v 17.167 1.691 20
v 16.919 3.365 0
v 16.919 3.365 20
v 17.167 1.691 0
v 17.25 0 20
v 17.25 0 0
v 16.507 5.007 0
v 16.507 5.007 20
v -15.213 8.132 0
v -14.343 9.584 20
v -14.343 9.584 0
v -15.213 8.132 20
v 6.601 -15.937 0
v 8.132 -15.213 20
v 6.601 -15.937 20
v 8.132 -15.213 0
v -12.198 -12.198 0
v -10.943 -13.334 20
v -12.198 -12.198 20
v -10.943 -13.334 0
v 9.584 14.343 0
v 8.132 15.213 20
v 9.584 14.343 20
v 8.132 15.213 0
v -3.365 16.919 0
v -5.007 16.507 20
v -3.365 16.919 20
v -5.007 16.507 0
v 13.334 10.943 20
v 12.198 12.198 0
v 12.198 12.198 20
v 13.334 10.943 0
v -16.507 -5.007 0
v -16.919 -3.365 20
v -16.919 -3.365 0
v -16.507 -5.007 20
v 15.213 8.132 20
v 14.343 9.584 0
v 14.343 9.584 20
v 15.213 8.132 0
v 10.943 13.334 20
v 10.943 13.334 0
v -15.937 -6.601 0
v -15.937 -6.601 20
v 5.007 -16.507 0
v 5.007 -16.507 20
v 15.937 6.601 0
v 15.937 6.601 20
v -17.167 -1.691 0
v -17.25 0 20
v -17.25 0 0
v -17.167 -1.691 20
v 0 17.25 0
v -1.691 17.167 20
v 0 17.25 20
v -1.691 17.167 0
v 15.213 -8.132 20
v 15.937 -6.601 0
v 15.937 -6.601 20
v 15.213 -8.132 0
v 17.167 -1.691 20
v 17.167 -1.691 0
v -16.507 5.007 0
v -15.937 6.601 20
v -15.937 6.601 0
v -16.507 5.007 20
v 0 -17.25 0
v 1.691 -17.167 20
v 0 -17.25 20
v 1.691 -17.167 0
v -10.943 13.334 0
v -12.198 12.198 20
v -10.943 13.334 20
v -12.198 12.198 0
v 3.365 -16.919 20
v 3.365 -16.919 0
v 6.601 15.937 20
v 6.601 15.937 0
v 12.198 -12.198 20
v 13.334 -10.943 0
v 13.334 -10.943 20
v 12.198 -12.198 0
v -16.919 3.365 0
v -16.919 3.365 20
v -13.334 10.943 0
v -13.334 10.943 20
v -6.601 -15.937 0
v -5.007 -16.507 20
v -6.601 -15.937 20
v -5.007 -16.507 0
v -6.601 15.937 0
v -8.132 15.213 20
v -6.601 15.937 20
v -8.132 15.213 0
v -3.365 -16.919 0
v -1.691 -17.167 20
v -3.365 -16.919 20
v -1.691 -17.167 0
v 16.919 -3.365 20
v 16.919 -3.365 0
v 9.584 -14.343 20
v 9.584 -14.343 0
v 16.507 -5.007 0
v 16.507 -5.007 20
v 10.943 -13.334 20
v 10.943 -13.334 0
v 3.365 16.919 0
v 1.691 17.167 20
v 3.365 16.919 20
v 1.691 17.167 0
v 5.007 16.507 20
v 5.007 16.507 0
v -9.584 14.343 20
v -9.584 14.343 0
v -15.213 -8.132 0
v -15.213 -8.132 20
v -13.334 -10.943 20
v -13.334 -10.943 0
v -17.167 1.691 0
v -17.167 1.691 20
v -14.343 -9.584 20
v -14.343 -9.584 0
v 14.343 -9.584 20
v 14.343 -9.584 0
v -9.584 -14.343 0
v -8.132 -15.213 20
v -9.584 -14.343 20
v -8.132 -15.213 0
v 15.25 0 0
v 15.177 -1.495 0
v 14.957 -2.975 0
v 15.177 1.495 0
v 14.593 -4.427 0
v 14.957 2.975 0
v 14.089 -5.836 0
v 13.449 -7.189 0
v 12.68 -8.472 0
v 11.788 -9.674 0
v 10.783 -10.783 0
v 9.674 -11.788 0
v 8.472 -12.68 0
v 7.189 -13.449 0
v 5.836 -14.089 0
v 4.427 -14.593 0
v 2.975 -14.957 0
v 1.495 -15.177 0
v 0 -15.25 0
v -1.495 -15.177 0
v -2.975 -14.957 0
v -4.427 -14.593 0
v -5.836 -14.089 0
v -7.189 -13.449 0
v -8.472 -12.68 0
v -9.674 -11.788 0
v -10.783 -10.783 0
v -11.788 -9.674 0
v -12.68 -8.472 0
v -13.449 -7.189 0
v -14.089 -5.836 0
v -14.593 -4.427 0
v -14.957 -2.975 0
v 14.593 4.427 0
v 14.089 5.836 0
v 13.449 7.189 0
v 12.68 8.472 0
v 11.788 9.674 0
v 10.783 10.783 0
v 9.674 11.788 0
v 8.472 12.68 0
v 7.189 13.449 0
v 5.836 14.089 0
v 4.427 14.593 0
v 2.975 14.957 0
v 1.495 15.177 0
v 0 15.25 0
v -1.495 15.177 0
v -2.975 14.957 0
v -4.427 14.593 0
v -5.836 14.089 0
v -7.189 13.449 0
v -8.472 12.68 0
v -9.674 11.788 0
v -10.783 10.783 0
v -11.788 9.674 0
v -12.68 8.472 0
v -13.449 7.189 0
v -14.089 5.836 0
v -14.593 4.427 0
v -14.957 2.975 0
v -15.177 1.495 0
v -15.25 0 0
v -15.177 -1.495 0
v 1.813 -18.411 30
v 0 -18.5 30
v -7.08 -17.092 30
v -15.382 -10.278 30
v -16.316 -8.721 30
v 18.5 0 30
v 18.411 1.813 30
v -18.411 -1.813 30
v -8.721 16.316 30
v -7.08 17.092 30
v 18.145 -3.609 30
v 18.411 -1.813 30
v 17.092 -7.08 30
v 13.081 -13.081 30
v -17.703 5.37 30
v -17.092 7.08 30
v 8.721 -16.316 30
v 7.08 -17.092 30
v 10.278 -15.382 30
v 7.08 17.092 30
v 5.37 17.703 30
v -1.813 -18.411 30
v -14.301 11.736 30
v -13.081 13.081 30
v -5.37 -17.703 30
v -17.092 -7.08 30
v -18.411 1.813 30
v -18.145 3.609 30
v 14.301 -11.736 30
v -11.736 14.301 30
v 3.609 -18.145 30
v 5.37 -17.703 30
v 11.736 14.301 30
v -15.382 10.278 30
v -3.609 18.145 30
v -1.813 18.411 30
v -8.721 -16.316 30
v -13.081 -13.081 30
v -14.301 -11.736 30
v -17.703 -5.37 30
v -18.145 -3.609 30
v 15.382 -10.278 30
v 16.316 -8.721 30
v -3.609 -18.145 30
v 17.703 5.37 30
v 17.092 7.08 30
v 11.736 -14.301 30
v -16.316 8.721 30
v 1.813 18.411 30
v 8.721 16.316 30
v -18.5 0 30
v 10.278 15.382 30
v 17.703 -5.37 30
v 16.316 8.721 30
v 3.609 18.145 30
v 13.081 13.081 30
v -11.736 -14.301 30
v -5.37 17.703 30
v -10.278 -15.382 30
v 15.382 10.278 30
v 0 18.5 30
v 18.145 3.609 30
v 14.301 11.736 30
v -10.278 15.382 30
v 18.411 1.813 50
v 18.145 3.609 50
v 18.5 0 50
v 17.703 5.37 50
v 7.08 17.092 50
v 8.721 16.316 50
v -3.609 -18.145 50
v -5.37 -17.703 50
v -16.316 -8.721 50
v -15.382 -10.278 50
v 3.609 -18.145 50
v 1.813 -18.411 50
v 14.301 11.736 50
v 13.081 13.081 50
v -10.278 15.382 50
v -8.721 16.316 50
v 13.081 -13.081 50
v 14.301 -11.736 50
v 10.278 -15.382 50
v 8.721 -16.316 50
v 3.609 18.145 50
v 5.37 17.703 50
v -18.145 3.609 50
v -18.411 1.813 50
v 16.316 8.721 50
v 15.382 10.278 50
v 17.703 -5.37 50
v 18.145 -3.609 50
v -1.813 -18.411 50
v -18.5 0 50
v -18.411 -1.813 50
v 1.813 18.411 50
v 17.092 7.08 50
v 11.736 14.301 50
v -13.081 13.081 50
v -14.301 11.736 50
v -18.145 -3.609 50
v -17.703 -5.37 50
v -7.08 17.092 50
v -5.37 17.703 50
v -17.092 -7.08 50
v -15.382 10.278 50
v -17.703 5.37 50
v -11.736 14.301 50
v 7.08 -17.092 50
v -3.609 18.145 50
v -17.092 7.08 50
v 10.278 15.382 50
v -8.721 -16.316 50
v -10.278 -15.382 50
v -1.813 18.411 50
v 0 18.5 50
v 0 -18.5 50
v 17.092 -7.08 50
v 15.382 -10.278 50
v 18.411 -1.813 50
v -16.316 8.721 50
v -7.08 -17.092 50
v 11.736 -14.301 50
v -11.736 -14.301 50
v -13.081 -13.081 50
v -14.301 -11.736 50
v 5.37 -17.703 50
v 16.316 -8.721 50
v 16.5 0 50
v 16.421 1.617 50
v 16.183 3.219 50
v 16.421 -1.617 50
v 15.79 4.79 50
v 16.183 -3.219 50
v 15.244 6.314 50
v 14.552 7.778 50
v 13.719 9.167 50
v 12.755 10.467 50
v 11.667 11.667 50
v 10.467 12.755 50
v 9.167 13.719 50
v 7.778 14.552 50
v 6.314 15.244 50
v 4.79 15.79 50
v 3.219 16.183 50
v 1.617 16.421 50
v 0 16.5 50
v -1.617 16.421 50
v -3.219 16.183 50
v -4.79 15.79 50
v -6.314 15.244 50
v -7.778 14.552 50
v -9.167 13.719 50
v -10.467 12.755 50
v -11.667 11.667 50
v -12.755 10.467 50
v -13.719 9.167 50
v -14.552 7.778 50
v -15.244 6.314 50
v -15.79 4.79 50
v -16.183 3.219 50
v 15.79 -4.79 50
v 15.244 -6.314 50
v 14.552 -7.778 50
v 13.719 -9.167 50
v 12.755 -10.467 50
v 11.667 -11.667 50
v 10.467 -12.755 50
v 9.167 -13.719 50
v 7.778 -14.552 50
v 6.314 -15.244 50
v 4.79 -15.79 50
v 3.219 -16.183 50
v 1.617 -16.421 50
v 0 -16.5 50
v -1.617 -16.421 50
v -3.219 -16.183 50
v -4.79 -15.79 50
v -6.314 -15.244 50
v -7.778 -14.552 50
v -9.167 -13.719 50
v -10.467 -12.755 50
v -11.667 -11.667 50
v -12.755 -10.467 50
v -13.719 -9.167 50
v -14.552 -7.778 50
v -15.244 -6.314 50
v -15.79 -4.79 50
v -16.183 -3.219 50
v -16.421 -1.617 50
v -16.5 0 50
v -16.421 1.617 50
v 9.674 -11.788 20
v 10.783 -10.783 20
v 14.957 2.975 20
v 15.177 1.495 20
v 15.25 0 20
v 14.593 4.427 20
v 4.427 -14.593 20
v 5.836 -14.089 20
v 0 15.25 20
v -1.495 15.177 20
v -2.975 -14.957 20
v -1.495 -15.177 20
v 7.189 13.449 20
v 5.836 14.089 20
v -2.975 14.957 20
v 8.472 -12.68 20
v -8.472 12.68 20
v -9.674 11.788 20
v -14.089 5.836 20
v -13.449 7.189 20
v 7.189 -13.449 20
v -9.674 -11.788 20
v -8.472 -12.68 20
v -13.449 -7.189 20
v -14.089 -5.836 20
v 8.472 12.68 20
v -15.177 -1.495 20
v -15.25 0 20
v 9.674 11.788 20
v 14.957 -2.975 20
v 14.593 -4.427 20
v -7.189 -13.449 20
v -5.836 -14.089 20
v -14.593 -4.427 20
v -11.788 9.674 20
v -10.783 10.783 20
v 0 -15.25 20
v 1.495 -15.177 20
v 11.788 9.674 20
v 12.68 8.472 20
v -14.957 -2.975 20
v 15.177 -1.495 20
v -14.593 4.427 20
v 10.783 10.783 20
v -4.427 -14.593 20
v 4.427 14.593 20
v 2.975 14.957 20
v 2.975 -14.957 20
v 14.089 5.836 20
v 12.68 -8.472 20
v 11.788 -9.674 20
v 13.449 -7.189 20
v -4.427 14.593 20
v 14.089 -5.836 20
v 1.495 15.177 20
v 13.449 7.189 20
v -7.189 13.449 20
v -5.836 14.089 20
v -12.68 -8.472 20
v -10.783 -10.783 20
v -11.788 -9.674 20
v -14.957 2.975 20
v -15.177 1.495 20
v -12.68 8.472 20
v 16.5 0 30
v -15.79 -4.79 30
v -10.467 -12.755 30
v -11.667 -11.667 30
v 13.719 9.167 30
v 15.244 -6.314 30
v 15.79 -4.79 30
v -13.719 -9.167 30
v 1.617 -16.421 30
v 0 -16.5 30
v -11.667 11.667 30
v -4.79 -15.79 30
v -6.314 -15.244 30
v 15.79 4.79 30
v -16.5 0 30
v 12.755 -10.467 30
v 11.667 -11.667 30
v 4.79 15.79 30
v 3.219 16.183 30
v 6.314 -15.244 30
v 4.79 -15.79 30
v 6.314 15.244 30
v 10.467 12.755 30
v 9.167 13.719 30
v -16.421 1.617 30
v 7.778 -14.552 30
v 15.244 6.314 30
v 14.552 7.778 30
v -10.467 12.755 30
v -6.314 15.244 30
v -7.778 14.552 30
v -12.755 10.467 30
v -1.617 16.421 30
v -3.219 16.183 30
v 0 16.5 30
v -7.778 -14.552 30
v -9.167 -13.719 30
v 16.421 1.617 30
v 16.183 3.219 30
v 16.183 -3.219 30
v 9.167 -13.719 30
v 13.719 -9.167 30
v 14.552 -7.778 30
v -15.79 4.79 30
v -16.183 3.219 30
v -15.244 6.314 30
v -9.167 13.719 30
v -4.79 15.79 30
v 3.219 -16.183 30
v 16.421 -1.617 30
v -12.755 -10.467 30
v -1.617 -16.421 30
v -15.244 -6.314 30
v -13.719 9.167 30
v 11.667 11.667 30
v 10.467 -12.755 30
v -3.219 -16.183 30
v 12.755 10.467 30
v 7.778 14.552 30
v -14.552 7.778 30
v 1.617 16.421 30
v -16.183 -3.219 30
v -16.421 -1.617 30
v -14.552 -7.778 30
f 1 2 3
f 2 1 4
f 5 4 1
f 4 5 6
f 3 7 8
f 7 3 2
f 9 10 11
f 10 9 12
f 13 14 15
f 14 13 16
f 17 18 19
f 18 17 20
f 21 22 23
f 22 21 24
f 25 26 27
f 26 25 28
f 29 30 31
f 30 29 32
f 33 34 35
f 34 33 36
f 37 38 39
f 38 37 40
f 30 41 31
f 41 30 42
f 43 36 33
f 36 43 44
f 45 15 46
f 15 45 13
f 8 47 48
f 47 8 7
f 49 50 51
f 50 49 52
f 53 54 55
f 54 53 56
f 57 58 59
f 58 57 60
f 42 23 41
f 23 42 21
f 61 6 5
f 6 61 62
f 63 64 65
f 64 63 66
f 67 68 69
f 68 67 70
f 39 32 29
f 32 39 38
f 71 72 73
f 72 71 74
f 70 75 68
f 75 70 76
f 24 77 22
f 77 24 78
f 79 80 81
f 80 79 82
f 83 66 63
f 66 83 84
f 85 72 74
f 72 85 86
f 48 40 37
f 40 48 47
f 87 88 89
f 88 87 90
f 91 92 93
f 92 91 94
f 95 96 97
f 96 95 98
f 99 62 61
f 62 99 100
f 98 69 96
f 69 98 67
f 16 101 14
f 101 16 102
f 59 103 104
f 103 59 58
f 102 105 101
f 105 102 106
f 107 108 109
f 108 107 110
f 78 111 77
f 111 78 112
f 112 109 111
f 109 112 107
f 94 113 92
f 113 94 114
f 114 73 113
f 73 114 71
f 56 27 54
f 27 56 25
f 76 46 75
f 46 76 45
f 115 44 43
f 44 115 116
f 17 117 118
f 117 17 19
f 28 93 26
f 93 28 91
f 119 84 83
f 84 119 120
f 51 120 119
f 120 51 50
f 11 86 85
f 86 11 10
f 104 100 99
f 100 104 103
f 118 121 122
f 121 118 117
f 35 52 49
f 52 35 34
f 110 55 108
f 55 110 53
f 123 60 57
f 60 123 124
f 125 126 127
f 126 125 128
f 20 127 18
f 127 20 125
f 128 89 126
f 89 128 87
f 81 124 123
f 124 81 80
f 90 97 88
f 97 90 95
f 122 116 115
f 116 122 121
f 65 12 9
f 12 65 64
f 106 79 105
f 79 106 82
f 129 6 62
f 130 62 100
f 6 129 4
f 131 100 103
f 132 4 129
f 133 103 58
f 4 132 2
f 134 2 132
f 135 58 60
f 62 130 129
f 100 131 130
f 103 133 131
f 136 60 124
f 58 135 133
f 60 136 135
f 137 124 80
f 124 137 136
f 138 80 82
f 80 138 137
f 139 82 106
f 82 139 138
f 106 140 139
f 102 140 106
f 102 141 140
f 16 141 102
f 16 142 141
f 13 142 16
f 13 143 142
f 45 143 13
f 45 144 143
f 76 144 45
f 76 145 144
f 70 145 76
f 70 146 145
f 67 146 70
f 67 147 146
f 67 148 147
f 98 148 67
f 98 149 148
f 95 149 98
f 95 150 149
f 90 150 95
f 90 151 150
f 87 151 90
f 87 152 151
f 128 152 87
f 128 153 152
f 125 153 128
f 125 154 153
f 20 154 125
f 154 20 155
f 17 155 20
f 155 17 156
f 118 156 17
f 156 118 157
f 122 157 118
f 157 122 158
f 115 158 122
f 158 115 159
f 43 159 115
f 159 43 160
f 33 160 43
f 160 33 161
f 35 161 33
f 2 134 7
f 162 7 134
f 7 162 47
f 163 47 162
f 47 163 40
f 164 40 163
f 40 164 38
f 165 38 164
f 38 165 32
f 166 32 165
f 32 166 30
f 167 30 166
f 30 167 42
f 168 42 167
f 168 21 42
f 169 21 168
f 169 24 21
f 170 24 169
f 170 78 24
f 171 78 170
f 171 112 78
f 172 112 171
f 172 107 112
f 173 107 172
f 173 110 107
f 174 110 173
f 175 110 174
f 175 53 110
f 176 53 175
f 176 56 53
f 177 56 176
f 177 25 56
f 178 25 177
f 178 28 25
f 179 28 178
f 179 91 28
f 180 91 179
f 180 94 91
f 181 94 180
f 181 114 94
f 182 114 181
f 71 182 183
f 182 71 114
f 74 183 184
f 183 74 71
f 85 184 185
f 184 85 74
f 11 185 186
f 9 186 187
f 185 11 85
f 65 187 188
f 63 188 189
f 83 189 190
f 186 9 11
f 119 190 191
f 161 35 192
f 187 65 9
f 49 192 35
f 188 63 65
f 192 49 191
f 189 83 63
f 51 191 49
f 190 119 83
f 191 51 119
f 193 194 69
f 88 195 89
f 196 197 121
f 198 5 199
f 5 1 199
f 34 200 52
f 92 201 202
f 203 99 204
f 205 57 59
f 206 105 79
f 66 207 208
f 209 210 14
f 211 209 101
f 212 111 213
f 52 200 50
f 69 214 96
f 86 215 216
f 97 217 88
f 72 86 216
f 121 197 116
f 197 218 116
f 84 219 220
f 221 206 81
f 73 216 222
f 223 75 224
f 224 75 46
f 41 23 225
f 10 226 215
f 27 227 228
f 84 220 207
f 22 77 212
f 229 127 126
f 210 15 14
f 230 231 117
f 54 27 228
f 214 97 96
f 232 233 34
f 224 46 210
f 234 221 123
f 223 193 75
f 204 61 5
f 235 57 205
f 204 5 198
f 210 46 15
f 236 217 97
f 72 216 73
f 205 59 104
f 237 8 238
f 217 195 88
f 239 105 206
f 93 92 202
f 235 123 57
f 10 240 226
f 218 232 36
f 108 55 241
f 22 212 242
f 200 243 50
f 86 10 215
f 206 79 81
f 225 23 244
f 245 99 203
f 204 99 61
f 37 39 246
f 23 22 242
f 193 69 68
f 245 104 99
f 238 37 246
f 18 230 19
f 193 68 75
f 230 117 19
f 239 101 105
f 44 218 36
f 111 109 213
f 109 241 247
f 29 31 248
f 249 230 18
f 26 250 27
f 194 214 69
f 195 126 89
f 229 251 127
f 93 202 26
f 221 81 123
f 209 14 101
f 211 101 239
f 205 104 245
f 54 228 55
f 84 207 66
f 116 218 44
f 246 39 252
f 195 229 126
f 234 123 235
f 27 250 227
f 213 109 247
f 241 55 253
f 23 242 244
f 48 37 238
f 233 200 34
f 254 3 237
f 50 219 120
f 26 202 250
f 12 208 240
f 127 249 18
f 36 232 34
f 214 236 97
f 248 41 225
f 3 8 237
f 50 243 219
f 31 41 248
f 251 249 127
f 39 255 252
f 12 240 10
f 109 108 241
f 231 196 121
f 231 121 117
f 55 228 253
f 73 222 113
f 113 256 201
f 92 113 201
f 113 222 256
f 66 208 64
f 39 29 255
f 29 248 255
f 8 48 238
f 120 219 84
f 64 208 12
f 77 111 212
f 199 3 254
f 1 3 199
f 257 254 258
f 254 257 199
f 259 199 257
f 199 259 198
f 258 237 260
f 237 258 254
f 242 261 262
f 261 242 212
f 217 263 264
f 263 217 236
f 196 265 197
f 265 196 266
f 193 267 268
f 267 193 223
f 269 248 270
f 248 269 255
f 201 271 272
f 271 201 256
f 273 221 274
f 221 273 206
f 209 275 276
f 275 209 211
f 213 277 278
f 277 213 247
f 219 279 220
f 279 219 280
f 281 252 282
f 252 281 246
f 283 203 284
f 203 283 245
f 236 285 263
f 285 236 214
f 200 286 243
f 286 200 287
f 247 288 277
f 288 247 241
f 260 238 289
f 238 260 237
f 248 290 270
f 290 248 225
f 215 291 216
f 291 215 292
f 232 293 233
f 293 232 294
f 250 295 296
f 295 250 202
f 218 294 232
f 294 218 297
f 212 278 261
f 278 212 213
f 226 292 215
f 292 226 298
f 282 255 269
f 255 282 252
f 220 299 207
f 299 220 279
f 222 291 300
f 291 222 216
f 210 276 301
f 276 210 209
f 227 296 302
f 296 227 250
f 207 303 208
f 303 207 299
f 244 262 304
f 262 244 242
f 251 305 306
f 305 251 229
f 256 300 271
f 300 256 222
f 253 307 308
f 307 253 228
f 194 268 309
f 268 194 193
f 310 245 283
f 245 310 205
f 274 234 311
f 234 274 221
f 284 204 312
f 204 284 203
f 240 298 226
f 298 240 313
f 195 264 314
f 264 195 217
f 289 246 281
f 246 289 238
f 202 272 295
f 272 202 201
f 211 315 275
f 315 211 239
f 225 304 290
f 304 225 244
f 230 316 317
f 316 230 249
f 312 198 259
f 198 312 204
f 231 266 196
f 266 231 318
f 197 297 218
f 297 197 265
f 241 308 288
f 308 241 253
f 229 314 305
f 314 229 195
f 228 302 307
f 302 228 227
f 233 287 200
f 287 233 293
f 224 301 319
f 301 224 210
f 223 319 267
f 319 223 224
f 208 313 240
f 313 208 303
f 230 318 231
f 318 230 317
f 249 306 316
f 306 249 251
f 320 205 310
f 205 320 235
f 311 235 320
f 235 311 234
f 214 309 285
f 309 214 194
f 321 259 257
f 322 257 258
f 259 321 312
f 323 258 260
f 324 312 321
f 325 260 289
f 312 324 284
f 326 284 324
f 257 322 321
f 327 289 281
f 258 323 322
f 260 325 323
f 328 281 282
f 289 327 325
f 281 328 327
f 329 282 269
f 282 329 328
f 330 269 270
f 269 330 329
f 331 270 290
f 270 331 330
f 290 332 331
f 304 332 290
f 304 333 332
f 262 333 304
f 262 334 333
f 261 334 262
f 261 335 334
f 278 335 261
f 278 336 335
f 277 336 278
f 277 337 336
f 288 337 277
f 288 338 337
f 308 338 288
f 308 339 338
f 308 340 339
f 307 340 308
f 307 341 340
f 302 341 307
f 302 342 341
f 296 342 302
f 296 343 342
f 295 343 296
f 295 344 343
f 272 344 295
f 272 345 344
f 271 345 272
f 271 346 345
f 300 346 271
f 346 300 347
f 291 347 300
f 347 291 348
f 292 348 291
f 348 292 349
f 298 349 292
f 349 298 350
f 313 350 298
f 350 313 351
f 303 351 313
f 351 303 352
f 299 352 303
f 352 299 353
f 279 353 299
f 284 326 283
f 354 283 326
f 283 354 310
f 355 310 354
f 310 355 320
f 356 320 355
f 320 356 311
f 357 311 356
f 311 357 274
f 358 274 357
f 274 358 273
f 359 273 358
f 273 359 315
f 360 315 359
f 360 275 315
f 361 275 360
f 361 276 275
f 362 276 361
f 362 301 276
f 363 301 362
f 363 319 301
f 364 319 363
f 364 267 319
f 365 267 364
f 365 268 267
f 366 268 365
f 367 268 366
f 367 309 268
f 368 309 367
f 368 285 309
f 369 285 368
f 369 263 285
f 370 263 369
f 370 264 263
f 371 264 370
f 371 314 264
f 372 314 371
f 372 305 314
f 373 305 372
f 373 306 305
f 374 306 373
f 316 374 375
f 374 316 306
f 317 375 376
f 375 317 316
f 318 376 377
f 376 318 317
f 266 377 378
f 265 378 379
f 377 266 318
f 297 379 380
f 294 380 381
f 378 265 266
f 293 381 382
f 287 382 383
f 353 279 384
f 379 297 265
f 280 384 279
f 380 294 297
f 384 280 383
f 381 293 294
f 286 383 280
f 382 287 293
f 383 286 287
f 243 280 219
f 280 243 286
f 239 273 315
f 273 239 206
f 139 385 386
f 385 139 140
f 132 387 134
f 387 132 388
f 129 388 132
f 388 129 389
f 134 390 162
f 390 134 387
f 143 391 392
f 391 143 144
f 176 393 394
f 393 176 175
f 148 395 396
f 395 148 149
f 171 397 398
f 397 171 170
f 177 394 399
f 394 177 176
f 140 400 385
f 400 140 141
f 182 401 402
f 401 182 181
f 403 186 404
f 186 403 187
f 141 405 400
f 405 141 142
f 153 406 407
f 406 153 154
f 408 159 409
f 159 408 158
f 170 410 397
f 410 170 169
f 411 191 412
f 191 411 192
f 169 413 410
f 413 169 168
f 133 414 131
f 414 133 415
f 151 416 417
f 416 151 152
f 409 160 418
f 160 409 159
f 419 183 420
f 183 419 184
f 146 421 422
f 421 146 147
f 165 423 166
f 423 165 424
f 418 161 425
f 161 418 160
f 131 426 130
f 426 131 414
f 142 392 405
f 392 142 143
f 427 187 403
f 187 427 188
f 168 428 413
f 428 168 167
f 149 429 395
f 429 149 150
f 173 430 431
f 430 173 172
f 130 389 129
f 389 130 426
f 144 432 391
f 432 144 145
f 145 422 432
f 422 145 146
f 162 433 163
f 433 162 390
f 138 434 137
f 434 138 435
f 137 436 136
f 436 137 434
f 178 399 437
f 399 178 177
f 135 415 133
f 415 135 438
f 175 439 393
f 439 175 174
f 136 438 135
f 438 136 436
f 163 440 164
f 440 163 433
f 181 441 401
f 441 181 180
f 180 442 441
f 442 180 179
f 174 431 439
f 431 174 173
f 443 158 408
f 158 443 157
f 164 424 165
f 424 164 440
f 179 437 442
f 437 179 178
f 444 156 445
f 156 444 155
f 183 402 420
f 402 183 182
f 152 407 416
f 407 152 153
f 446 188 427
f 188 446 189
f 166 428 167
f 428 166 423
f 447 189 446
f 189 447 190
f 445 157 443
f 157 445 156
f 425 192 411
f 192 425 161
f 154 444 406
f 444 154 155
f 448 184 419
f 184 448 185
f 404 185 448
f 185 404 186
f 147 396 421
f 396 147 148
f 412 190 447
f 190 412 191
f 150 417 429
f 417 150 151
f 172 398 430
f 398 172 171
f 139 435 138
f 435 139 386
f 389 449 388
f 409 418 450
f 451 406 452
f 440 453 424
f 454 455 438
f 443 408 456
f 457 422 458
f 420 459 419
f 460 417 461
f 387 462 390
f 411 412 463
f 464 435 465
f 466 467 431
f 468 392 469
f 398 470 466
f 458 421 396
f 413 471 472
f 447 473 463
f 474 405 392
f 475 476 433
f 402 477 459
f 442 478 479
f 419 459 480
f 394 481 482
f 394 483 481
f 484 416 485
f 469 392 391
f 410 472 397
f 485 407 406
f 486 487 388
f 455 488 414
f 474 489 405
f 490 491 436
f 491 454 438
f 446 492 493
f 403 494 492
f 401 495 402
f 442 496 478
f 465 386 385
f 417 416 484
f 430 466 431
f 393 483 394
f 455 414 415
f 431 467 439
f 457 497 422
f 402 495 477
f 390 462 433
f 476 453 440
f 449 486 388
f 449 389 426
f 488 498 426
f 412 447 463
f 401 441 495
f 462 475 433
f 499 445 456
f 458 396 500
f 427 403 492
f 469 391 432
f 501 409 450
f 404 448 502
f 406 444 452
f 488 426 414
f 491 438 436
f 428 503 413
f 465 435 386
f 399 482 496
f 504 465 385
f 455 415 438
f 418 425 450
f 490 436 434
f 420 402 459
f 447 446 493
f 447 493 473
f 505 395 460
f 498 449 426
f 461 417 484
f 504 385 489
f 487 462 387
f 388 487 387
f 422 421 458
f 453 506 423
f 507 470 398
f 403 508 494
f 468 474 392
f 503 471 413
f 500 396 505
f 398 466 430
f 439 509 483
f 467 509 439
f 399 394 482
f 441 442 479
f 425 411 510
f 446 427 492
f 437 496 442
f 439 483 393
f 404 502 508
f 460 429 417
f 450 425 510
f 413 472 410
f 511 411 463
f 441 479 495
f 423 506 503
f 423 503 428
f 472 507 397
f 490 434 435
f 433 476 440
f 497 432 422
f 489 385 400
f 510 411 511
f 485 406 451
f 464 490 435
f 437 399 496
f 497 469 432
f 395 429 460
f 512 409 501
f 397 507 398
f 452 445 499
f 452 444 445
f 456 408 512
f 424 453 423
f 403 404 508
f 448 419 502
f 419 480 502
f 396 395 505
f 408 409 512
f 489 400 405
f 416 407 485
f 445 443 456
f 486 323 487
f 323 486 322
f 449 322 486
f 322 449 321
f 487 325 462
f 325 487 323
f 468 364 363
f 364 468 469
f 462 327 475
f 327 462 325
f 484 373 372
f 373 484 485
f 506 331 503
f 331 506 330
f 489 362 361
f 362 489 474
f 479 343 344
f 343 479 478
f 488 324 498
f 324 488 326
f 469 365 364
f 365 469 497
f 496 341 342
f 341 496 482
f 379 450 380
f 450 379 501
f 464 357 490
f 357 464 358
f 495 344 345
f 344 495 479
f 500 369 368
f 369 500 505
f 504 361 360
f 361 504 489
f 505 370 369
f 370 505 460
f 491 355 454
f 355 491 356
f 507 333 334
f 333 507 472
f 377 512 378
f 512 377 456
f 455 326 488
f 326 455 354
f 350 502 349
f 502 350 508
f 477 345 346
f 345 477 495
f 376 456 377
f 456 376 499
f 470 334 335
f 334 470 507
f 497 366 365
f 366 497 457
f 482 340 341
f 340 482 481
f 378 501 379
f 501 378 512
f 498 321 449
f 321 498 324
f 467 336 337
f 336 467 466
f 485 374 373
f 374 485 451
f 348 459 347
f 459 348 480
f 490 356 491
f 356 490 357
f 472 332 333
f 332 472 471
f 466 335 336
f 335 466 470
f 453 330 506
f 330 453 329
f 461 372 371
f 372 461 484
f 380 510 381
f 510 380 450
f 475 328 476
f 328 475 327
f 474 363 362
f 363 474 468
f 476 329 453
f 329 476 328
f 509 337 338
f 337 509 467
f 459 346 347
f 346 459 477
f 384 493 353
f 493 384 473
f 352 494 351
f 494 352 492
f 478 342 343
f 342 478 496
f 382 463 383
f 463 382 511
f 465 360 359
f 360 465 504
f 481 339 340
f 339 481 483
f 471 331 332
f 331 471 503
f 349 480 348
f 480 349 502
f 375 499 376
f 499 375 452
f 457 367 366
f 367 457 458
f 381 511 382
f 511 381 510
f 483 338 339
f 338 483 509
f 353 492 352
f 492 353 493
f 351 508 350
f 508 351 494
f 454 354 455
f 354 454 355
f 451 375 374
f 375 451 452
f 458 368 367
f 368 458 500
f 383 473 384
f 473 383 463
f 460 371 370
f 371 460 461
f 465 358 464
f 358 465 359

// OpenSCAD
/**
 * Hose adapter for Makita vacuums and dust extractors.
 *
 * This adapter fits inside tool dust ports and enables them to be connected to
 * Makita vacuums. All dimensions are in millimeters.
 */

/* [Adapter] */
// Inside diameter of the tool dust port
Tool_Port_Diameter = 34.5;

// Inside diameter of the Makita vacuum hose connection
Hose_Port_Diameter = 37;

// Wall thickness of the adapter shell
Wall_Thickness = 2;

// Length of each cylindrical end section
End_Length = 20;

// Length of the tapered middle section
Taper_Length = 10;

/* [Hidden] */
$fn = 64;
EPSILON = 0.02;

assert(Wall_Thickness > 0, "Wall_Thickness must be positive");
assert(2 * Wall_Thickness < Tool_Port_Diameter, "Wall_Thickness must be less than half Tool_Port_Diameter");
assert(2 * Wall_Thickness < Hose_Port_Diameter, "Wall_Thickness must be less than half Hose_Port_Diameter");

module hose_adapter(d1, d2, thickness) {
  module shell(d1, d2) {
    cylinder(h = End_Length, d = d1);
    translate([0, 0, End_Length])
      cylinder(h = Taper_Length, d1 = d1, d2 = d2);
    translate([0, 0, End_Length + Taper_Length])
      cylinder(h = End_Length, d = d2);
  }

  difference() {
    shell(d1, d2);
    translate([0, 0, -EPSILON]) {
      cylinder(h = End_Length + EPSILON, d = d1 - 2 * thickness);
      translate([0, 0, End_Length + EPSILON])
        cylinder(h = Taper_Length, d1 = d1 - 2 * thickness, d2 = d2 - 2 * thickness);
      translate([0, 0, End_Length + EPSILON + Taper_Length])
        cylinder(h = End_Length + EPSILON, d = d2 - 2 * thickness);
    }
  }
}

hose_adapter(
  Tool_Port_Diameter,
  Hose_Port_Diameter,
  Wall_Thickness
);
